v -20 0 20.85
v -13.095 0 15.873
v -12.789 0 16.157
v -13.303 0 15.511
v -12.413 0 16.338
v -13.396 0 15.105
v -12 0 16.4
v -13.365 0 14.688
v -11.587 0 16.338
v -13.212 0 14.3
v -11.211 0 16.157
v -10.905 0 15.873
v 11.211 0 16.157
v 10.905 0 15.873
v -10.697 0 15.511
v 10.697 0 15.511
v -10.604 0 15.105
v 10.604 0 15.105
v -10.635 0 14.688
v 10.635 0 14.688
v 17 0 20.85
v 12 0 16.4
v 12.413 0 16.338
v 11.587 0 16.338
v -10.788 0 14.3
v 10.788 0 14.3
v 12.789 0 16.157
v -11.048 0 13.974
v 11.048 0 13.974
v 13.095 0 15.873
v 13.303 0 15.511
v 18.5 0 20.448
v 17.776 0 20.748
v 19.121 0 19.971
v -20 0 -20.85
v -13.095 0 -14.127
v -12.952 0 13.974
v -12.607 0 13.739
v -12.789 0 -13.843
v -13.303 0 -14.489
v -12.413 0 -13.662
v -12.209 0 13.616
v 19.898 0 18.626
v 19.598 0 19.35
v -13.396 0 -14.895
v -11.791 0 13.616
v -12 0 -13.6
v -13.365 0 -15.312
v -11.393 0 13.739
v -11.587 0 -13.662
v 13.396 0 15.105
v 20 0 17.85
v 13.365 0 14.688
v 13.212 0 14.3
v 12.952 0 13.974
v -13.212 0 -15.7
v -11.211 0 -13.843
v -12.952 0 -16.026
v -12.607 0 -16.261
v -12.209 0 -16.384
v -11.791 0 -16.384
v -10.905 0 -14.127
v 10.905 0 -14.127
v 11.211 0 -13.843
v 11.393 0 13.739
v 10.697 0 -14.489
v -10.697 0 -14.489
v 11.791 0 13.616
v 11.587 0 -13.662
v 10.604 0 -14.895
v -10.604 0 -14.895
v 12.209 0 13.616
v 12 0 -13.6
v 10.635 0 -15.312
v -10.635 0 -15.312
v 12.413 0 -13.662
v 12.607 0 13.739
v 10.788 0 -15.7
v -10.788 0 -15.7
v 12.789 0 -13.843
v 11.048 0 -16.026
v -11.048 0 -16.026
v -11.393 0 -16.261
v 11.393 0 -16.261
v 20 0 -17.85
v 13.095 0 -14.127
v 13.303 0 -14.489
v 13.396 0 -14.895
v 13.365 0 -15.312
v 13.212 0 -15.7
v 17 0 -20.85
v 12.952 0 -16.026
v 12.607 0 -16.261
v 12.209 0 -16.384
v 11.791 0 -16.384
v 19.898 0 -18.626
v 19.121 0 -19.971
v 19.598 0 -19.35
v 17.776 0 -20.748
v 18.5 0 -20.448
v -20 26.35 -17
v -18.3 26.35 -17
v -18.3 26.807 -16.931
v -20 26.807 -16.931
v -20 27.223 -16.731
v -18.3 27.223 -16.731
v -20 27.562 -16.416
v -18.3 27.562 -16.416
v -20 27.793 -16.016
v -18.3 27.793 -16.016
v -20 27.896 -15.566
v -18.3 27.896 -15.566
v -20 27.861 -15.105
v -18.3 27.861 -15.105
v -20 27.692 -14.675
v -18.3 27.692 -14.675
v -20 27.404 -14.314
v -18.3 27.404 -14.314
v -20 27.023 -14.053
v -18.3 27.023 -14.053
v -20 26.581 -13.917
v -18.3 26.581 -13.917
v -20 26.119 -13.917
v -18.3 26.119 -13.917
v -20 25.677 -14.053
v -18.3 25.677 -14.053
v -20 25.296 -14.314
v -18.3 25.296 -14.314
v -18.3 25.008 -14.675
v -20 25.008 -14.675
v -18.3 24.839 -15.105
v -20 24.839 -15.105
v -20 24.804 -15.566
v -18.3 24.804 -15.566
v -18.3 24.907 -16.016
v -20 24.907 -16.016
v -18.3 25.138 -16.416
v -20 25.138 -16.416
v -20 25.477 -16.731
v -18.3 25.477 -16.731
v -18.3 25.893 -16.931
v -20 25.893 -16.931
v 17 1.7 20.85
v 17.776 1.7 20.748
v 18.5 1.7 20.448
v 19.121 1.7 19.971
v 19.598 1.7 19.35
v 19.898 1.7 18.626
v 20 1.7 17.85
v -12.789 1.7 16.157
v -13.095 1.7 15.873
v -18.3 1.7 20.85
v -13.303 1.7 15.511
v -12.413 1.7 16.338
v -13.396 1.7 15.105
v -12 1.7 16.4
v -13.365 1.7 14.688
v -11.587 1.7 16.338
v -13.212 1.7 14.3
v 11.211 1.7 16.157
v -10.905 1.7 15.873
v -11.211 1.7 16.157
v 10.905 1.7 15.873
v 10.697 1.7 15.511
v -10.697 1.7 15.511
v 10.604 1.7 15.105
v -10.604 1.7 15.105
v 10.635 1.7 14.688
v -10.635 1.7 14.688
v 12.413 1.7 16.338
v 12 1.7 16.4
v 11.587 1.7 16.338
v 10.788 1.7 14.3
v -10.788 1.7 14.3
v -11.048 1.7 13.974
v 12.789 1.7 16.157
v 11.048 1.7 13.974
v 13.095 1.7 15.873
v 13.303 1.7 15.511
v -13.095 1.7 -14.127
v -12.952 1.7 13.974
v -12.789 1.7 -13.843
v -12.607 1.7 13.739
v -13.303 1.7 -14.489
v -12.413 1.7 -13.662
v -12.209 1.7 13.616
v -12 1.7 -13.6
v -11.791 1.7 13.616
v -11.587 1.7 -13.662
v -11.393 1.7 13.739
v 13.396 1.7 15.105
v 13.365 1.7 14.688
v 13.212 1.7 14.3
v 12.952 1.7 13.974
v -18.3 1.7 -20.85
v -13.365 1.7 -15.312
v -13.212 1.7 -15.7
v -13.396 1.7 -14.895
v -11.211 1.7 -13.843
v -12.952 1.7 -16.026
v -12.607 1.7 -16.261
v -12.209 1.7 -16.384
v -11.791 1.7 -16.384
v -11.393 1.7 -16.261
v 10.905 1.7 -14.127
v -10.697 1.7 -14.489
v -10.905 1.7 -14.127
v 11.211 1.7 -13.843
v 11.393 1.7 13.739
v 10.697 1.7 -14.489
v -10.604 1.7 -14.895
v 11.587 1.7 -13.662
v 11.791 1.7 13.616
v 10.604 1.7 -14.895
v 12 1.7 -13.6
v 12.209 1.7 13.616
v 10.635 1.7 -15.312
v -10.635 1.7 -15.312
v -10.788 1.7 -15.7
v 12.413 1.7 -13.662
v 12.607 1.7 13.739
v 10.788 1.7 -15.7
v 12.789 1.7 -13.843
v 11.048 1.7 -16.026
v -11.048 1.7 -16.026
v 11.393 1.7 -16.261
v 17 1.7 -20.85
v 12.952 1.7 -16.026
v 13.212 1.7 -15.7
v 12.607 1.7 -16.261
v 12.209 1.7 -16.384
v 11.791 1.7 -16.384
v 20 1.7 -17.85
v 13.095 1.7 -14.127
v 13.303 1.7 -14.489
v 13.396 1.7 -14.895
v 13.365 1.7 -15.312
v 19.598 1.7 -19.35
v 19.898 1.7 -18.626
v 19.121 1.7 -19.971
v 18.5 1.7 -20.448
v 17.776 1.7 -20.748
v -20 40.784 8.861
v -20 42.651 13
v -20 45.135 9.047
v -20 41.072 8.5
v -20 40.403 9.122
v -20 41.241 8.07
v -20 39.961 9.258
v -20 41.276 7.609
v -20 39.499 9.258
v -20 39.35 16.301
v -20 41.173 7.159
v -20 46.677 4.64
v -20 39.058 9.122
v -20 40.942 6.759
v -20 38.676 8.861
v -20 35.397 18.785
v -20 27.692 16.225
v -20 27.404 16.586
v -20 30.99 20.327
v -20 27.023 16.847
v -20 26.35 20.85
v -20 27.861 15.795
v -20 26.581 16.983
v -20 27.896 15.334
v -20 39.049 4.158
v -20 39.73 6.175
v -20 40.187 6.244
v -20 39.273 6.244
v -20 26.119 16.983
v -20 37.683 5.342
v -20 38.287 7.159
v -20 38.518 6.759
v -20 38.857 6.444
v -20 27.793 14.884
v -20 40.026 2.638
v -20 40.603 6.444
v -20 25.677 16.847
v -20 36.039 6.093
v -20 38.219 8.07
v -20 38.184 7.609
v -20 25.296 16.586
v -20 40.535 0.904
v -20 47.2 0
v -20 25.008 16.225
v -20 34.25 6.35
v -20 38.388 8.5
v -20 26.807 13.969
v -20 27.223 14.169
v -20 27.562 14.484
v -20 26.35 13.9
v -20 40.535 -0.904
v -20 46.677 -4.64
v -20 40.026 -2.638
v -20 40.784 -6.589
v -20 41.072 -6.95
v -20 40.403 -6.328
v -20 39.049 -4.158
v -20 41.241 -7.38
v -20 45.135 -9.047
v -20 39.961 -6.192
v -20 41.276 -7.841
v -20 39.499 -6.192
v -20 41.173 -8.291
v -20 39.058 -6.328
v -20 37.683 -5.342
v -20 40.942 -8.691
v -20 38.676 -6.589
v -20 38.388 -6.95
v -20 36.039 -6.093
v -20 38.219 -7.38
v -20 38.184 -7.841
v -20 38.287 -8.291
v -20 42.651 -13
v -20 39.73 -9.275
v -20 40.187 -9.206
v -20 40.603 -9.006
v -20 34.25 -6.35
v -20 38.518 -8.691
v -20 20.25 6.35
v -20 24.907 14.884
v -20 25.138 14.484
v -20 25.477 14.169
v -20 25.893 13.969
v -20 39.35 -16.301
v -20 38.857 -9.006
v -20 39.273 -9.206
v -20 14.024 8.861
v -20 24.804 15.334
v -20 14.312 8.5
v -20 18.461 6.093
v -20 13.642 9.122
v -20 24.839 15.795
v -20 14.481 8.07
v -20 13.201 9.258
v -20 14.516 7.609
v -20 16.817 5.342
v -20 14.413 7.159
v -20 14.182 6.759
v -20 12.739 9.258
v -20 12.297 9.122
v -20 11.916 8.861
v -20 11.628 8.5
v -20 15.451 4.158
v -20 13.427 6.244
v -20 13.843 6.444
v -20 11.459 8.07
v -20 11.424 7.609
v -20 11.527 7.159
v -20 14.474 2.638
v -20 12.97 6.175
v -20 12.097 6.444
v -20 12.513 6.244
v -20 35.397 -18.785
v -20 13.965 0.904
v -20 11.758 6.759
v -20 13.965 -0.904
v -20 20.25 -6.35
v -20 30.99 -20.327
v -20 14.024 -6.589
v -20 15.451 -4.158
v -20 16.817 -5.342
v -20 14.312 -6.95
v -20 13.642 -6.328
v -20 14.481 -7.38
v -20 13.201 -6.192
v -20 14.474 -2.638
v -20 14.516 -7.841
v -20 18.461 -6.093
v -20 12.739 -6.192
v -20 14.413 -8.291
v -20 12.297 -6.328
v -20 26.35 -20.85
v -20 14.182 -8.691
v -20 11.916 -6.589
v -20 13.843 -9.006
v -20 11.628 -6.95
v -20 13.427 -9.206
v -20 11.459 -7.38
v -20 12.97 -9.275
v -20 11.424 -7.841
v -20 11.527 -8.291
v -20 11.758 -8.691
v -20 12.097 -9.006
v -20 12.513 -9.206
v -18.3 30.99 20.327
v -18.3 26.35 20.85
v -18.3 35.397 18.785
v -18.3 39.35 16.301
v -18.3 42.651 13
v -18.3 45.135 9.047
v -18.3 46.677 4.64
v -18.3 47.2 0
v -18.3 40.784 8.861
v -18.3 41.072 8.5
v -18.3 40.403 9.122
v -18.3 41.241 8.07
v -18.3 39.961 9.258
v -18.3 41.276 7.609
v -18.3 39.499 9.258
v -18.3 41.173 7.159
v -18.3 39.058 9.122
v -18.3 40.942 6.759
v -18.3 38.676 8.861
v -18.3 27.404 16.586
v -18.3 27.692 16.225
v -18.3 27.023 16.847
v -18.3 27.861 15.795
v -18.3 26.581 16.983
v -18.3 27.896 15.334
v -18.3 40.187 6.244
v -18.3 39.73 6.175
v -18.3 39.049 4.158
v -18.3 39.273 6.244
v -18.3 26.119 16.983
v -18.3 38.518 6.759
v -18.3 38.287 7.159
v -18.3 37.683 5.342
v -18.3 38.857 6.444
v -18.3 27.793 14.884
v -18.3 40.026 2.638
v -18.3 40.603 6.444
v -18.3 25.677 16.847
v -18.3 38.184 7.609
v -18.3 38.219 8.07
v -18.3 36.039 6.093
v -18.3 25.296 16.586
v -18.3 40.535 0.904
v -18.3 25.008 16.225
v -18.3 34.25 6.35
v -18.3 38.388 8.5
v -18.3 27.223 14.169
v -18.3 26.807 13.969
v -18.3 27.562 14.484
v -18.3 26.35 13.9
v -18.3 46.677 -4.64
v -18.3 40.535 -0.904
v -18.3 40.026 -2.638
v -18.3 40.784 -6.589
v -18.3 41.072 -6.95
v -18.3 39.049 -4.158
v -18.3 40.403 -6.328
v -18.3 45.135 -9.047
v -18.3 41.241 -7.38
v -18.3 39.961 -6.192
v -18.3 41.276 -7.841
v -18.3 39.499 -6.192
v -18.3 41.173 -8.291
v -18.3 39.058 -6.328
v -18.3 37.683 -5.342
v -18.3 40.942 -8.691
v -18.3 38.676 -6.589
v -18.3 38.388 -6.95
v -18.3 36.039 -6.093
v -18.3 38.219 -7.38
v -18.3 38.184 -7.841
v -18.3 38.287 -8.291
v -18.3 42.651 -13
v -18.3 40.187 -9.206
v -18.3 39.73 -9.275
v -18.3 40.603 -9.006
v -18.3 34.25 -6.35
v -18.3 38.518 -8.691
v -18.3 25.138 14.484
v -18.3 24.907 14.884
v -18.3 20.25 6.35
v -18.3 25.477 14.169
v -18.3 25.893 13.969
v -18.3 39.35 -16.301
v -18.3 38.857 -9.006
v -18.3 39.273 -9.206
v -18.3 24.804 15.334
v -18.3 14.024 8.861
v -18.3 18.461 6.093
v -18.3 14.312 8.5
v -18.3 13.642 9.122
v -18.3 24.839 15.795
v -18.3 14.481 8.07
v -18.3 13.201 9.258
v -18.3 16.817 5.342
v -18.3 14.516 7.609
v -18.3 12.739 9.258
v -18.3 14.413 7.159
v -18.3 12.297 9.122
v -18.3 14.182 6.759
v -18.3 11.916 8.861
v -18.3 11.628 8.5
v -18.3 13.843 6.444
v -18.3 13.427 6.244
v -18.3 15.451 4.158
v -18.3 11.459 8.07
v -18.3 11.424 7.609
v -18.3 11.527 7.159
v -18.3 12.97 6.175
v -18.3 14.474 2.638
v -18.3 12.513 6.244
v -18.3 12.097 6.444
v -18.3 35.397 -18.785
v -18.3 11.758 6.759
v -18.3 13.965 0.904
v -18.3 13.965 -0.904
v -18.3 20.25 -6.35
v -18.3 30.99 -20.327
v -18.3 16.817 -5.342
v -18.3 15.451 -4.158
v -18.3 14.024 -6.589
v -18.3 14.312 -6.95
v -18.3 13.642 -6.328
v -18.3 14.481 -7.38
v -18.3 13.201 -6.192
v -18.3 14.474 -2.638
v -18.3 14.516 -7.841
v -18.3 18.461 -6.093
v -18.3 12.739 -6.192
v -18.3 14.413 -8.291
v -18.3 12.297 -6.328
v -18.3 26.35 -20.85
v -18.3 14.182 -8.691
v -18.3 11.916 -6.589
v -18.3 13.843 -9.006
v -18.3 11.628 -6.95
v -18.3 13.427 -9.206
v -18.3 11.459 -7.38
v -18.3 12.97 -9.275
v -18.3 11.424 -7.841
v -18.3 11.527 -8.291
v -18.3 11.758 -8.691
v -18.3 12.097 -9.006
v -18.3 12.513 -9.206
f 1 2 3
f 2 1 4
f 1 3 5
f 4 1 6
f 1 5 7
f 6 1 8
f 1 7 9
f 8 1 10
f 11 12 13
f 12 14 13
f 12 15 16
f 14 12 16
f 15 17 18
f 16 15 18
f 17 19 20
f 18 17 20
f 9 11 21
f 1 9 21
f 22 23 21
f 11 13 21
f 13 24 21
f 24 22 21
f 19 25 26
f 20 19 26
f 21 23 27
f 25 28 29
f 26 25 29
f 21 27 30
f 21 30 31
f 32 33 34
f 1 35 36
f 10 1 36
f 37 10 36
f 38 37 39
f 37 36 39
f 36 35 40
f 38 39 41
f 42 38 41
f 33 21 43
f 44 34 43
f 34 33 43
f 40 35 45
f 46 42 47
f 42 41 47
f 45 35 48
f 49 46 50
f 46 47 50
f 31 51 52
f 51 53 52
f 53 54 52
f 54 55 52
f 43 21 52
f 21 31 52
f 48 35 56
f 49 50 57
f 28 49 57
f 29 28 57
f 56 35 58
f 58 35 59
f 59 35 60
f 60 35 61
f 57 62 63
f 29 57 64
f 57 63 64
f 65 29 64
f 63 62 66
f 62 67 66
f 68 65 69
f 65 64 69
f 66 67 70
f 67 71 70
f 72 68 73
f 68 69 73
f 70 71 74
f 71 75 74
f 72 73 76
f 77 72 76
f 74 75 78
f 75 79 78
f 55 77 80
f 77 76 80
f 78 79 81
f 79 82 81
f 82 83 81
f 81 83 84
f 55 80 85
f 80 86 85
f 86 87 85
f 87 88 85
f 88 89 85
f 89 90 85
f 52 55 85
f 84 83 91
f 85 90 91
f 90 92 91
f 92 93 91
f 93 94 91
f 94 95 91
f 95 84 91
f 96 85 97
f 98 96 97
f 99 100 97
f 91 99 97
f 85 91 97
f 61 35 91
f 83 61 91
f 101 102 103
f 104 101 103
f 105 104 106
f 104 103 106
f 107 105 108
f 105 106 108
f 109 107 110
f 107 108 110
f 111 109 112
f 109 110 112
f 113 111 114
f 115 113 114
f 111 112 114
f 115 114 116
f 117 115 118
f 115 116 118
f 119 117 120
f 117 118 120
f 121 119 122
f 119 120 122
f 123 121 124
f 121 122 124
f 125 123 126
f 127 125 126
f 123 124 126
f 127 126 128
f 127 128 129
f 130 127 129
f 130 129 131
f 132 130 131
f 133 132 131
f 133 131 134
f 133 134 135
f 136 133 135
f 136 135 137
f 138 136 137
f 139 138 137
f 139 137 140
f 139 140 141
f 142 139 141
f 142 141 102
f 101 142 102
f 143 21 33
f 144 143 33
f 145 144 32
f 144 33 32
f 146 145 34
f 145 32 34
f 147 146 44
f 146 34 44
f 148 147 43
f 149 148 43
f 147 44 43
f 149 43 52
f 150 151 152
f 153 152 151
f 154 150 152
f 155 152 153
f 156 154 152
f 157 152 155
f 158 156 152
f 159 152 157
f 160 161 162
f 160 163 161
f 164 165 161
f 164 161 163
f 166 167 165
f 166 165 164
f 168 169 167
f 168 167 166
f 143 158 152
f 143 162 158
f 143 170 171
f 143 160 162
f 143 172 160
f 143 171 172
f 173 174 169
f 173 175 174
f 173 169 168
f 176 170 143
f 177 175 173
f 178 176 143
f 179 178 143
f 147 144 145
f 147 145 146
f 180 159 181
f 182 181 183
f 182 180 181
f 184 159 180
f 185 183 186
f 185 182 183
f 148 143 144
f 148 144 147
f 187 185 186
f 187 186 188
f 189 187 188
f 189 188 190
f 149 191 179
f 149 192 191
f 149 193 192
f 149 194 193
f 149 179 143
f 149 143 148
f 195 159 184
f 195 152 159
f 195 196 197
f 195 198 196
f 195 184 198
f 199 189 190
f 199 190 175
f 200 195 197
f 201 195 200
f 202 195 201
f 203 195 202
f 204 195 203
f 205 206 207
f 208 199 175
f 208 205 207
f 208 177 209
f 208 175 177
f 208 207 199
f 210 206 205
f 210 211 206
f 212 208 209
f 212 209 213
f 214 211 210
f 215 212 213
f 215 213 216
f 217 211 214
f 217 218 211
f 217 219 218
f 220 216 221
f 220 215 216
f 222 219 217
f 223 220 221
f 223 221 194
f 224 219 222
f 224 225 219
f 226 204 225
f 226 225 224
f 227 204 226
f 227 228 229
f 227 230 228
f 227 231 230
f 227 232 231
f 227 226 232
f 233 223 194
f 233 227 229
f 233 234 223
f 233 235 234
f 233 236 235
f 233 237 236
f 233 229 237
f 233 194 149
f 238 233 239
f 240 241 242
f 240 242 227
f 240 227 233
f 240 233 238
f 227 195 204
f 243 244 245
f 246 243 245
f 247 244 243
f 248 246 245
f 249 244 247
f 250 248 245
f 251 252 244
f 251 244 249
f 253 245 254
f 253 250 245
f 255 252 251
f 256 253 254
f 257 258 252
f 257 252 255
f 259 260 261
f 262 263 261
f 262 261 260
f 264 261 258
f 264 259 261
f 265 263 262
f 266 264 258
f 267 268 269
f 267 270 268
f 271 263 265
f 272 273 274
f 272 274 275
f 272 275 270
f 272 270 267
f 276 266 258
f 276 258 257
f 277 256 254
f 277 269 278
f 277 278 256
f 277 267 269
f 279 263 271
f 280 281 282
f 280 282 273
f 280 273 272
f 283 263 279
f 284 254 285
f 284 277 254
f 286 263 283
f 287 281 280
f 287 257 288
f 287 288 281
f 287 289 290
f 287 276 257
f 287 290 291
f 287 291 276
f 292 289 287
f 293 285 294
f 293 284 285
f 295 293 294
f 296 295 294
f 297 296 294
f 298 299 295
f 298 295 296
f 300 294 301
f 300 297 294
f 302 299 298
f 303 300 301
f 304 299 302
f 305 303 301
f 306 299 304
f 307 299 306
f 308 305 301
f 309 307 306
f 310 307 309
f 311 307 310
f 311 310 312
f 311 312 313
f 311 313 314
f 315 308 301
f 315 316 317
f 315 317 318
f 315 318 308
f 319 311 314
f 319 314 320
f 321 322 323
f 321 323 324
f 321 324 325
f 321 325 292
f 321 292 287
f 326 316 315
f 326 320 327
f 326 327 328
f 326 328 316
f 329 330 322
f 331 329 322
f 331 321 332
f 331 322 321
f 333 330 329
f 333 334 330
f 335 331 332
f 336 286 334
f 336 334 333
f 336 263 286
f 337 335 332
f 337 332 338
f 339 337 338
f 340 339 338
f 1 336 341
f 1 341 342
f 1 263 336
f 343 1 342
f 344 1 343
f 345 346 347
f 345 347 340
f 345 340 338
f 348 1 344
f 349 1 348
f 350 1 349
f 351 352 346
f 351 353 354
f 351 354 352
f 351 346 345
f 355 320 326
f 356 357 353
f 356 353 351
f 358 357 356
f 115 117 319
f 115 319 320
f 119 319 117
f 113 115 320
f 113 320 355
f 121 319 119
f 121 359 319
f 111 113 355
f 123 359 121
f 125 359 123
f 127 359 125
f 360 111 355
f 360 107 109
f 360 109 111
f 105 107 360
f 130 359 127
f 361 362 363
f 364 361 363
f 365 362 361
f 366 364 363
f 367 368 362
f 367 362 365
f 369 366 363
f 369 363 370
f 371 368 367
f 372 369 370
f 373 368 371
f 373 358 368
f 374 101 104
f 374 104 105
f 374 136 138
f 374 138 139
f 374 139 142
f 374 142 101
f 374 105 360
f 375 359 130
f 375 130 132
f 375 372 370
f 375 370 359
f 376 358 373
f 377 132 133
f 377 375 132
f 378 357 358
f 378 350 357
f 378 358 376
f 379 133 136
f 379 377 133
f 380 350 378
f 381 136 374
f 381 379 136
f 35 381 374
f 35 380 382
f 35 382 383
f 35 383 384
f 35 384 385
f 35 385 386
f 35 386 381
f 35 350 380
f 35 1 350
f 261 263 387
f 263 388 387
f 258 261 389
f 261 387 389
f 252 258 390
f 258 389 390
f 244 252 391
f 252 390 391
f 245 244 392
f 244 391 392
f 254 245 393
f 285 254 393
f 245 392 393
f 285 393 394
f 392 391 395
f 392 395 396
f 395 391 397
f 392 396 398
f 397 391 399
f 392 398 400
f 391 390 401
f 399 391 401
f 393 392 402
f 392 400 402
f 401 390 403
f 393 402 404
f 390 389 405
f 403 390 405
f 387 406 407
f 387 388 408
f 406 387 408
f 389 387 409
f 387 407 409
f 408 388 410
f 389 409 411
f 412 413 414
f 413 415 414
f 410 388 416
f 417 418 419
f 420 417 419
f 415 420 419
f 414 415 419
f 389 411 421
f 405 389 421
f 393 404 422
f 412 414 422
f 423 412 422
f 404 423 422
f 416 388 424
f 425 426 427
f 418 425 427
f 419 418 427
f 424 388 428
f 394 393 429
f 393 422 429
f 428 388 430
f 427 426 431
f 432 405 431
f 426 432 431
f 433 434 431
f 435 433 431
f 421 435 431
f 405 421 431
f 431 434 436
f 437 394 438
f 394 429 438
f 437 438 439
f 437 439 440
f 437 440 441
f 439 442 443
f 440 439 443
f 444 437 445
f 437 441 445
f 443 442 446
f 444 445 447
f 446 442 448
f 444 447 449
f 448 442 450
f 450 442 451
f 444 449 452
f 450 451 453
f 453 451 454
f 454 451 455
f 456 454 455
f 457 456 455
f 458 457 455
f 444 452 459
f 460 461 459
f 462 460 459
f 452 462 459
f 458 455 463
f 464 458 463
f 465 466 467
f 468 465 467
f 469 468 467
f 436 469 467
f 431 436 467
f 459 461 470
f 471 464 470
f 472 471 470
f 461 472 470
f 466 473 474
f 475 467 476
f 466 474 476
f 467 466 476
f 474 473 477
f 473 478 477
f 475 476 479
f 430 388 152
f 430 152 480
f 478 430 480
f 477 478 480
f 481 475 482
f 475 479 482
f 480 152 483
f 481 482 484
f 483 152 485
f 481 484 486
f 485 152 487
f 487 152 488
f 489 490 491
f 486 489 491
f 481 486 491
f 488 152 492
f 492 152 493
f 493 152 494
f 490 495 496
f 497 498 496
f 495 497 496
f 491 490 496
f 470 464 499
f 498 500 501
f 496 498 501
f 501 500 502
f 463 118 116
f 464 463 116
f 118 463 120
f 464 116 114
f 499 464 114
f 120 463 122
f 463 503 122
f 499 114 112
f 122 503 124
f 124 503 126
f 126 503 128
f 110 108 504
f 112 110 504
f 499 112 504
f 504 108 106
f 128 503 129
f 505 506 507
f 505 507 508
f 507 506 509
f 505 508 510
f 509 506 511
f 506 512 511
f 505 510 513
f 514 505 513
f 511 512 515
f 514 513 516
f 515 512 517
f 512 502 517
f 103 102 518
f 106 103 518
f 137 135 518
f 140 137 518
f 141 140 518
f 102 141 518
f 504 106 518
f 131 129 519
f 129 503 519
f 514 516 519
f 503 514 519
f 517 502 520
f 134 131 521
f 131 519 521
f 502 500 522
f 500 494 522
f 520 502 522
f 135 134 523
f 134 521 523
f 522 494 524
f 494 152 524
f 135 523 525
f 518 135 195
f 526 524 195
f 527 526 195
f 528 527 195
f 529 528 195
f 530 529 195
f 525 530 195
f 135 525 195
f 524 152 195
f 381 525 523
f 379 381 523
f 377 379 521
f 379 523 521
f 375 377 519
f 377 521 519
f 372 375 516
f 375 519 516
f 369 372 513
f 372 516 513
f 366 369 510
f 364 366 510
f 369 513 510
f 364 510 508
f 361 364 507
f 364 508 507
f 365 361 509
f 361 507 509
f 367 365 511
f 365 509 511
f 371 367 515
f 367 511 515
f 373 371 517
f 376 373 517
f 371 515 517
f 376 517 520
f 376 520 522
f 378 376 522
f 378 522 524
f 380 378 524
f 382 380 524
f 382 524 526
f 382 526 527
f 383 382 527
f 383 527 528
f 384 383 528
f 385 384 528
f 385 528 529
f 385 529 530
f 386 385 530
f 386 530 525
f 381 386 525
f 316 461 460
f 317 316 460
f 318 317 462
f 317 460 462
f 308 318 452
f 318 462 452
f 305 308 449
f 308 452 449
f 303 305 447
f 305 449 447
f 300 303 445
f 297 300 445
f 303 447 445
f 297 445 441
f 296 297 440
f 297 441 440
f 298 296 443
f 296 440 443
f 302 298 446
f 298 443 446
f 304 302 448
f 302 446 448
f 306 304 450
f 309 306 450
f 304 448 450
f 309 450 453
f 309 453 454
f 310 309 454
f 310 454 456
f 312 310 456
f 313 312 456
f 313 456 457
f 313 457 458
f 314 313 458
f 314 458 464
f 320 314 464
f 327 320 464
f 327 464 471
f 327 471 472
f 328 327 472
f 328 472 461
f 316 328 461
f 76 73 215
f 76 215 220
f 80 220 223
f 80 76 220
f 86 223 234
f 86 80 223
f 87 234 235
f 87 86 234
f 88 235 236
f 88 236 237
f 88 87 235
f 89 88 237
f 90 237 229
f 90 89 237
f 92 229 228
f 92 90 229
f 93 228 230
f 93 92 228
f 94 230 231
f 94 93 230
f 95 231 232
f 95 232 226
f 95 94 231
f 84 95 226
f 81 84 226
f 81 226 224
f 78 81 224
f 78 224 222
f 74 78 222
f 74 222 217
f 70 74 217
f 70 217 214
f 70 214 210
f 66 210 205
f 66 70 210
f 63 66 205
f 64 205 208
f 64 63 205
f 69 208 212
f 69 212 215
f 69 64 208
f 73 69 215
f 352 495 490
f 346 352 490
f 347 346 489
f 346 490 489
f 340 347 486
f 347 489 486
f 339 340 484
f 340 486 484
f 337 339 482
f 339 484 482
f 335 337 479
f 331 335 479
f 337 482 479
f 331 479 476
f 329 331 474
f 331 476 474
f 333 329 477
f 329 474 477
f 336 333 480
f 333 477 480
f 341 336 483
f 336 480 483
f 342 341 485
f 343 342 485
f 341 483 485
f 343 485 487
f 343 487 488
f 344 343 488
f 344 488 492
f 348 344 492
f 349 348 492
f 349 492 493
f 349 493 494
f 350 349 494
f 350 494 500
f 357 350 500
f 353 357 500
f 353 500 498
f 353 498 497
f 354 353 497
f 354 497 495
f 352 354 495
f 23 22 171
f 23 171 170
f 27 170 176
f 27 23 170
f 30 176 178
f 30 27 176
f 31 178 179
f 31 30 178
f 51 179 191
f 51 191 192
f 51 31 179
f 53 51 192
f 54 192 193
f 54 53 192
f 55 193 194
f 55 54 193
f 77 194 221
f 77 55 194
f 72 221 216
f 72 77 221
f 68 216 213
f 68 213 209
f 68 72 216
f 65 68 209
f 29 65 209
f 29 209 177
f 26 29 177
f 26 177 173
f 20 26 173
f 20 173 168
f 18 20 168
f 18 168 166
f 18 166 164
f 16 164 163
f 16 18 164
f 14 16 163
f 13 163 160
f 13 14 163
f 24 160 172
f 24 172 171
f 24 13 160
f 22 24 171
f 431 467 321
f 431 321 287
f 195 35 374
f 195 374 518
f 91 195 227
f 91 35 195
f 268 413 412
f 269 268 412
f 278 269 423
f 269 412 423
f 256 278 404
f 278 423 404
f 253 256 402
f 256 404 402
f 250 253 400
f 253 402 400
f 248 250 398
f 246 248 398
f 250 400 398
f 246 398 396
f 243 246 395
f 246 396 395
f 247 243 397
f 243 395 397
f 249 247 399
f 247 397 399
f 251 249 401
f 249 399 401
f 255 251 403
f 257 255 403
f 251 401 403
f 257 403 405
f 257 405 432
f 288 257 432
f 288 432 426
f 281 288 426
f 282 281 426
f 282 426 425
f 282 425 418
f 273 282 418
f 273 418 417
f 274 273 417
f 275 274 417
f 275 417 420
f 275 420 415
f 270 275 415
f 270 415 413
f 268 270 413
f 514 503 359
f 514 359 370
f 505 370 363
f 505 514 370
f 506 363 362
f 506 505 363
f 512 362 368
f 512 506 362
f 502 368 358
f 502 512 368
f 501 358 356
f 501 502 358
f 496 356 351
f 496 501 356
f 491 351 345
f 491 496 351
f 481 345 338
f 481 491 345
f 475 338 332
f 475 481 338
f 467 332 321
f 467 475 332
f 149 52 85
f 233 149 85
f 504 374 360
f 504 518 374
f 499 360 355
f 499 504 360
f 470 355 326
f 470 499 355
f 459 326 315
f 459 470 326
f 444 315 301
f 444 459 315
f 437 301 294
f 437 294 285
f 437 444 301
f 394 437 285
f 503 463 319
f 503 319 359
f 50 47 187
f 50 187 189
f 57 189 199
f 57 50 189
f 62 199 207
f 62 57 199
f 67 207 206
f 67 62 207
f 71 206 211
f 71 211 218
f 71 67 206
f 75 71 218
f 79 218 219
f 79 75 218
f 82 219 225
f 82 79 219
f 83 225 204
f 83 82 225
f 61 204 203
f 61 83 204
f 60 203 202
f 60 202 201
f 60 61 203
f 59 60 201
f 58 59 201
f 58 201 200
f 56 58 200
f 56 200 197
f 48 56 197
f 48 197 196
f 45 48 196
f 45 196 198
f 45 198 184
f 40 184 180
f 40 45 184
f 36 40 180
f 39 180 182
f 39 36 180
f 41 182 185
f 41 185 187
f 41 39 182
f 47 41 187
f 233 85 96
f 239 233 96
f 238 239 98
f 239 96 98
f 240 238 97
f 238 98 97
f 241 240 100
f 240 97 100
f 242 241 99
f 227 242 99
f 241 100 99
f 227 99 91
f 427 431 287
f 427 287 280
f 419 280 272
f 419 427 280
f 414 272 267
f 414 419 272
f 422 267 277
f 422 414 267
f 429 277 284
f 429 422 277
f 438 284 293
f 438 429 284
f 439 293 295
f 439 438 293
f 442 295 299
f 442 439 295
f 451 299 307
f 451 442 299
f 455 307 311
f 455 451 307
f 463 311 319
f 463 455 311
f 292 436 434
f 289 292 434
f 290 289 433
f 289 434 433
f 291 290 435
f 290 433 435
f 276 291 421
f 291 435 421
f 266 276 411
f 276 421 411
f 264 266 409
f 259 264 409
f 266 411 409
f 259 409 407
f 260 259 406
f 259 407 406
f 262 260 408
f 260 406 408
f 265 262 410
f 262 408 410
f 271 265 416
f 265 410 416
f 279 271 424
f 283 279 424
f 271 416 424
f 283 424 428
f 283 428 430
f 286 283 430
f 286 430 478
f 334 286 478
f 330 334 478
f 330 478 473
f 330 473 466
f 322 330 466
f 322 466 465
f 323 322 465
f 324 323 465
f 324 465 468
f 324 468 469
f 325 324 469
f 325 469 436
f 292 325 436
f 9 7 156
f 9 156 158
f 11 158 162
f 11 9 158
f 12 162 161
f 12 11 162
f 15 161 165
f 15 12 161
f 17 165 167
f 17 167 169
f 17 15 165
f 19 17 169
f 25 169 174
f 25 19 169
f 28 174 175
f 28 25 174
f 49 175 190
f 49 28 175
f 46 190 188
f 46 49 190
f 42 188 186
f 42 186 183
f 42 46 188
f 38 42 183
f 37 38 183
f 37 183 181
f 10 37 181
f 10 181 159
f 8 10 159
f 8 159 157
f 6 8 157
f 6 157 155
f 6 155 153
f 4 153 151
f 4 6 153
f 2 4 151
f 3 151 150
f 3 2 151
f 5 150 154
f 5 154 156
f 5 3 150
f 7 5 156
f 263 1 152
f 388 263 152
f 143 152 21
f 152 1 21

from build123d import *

# Parameters (mm, degrees)
CROQUIS1_R              = 1.4
SALIENTE_EXTRUIR1_DEPTH = 1.7
CROQUIS2_W              = 1.7
CROQUIS2_H              = 41.7
SALIENTE_EXTRUIR2_DEPTH = 45.5
REDONDEO1_R             = 20.85
CROQUIS3_R              = 1.55
CORTAR_EXTRUIR1_DEPTH   = 65.26081621


with BuildPart() as part:
    # Croquis1 → Saliente-Extruir1 (new body)
    with BuildSketch(Plane(origin=(0, 0, 0), x_dir=(1, 0, 0), z_dir=(0, 1, 0))):
        with BuildLine():
            Line((-20, -20.85), (17, -20.85))
            ThreePointArc((17, -20.85), (19.121320344, -19.971320344), (20, -17.85))
            Line((20, -17.85), (20, 17.85))
            ThreePointArc((20, 17.85), (19.121320344, 19.971320344), (17, 20.85))
            Line((17, 20.85), (-20, 20.85))
            Line((-20, 20.85), (-20, -20.85))
        make_face()
        with Locations(Location((-12, 15, 0), (0, 0, 270))):
            Circle(CROQUIS1_R, mode=Mode.SUBTRACT)
        with Locations(Location((12, 15, 0), (0, 0, 270))):
            Circle(CROQUIS1_R, mode=Mode.SUBTRACT)
        with Locations(Location((12, -15, 0), (0, 0, 270))):
            Circle(CROQUIS1_R, mode=Mode.SUBTRACT)
        with Locations(Location((-12, -15, 0), (0, 0, 270))):
            Circle(CROQUIS1_R, mode=Mode.SUBTRACT)
    extrude(amount=SALIENTE_EXTRUIR1_DEPTH)

    # Croquis2 → Saliente-Extruir2 (add)
    with BuildSketch(Plane(origin=(0, 1.7, 0), x_dir=(1, 0, 0), z_dir=(0, 1, 0))):
        with Locations((-19.15, 0)):
            Rectangle(CROQUIS2_W, CROQUIS2_H)
    extrude(amount=SALIENTE_EXTRUIR2_DEPTH)

    # Redondeo1
    redondeo1_edges = [part.edges().sort_by_distance(p)[0] for p in [
        (-19.15, 47.2, -20.85),
        (-19.15, 47.2, 20.85),
    ]]
    fillet(redondeo1_edges, radius=REDONDEO1_R - 0.0001)  # a hair under: the kernel refuses the full size

    # Croquis3 → Cortar-Extruir1 (cut, through all)
    with BuildSketch(Plane(origin=(-18.3, 0, 0), x_dir=(0, 0, -1), z_dir=(1, 0, 0))):
        with Locations((15.45, 26.35)):
            Circle(CROQUIS3_R)
        with Locations((7.725, 12.969907512)):
            Circle(CROQUIS3_R)
        with Locations((-7.725, 12.969907512)):
            Circle(CROQUIS3_R)
        with Locations((-15.45, 26.35)):
            Circle(CROQUIS3_R)
        with Locations((-7.725, 39.730092488)):
            Circle(CROQUIS3_R)
        with Locations((7.725, 39.730092488)):
            Circle(CROQUIS3_R)
        with BuildLine():
            Line((6.35, 34.25), (6.35, 20.25))
            ThreePointArc((6.35, 20.25), (0, 13.9), (-6.35, 20.25))
            Line((-6.35, 20.25), (-6.35, 34.25))
            ThreePointArc((-6.35, 34.25), (0, 40.6), (6.35, 34.25))
        make_face()
    extrude(amount=-CORTAR_EXTRUIR1_DEPTH, mode=Mode.SUBTRACT)


solid = part.part
